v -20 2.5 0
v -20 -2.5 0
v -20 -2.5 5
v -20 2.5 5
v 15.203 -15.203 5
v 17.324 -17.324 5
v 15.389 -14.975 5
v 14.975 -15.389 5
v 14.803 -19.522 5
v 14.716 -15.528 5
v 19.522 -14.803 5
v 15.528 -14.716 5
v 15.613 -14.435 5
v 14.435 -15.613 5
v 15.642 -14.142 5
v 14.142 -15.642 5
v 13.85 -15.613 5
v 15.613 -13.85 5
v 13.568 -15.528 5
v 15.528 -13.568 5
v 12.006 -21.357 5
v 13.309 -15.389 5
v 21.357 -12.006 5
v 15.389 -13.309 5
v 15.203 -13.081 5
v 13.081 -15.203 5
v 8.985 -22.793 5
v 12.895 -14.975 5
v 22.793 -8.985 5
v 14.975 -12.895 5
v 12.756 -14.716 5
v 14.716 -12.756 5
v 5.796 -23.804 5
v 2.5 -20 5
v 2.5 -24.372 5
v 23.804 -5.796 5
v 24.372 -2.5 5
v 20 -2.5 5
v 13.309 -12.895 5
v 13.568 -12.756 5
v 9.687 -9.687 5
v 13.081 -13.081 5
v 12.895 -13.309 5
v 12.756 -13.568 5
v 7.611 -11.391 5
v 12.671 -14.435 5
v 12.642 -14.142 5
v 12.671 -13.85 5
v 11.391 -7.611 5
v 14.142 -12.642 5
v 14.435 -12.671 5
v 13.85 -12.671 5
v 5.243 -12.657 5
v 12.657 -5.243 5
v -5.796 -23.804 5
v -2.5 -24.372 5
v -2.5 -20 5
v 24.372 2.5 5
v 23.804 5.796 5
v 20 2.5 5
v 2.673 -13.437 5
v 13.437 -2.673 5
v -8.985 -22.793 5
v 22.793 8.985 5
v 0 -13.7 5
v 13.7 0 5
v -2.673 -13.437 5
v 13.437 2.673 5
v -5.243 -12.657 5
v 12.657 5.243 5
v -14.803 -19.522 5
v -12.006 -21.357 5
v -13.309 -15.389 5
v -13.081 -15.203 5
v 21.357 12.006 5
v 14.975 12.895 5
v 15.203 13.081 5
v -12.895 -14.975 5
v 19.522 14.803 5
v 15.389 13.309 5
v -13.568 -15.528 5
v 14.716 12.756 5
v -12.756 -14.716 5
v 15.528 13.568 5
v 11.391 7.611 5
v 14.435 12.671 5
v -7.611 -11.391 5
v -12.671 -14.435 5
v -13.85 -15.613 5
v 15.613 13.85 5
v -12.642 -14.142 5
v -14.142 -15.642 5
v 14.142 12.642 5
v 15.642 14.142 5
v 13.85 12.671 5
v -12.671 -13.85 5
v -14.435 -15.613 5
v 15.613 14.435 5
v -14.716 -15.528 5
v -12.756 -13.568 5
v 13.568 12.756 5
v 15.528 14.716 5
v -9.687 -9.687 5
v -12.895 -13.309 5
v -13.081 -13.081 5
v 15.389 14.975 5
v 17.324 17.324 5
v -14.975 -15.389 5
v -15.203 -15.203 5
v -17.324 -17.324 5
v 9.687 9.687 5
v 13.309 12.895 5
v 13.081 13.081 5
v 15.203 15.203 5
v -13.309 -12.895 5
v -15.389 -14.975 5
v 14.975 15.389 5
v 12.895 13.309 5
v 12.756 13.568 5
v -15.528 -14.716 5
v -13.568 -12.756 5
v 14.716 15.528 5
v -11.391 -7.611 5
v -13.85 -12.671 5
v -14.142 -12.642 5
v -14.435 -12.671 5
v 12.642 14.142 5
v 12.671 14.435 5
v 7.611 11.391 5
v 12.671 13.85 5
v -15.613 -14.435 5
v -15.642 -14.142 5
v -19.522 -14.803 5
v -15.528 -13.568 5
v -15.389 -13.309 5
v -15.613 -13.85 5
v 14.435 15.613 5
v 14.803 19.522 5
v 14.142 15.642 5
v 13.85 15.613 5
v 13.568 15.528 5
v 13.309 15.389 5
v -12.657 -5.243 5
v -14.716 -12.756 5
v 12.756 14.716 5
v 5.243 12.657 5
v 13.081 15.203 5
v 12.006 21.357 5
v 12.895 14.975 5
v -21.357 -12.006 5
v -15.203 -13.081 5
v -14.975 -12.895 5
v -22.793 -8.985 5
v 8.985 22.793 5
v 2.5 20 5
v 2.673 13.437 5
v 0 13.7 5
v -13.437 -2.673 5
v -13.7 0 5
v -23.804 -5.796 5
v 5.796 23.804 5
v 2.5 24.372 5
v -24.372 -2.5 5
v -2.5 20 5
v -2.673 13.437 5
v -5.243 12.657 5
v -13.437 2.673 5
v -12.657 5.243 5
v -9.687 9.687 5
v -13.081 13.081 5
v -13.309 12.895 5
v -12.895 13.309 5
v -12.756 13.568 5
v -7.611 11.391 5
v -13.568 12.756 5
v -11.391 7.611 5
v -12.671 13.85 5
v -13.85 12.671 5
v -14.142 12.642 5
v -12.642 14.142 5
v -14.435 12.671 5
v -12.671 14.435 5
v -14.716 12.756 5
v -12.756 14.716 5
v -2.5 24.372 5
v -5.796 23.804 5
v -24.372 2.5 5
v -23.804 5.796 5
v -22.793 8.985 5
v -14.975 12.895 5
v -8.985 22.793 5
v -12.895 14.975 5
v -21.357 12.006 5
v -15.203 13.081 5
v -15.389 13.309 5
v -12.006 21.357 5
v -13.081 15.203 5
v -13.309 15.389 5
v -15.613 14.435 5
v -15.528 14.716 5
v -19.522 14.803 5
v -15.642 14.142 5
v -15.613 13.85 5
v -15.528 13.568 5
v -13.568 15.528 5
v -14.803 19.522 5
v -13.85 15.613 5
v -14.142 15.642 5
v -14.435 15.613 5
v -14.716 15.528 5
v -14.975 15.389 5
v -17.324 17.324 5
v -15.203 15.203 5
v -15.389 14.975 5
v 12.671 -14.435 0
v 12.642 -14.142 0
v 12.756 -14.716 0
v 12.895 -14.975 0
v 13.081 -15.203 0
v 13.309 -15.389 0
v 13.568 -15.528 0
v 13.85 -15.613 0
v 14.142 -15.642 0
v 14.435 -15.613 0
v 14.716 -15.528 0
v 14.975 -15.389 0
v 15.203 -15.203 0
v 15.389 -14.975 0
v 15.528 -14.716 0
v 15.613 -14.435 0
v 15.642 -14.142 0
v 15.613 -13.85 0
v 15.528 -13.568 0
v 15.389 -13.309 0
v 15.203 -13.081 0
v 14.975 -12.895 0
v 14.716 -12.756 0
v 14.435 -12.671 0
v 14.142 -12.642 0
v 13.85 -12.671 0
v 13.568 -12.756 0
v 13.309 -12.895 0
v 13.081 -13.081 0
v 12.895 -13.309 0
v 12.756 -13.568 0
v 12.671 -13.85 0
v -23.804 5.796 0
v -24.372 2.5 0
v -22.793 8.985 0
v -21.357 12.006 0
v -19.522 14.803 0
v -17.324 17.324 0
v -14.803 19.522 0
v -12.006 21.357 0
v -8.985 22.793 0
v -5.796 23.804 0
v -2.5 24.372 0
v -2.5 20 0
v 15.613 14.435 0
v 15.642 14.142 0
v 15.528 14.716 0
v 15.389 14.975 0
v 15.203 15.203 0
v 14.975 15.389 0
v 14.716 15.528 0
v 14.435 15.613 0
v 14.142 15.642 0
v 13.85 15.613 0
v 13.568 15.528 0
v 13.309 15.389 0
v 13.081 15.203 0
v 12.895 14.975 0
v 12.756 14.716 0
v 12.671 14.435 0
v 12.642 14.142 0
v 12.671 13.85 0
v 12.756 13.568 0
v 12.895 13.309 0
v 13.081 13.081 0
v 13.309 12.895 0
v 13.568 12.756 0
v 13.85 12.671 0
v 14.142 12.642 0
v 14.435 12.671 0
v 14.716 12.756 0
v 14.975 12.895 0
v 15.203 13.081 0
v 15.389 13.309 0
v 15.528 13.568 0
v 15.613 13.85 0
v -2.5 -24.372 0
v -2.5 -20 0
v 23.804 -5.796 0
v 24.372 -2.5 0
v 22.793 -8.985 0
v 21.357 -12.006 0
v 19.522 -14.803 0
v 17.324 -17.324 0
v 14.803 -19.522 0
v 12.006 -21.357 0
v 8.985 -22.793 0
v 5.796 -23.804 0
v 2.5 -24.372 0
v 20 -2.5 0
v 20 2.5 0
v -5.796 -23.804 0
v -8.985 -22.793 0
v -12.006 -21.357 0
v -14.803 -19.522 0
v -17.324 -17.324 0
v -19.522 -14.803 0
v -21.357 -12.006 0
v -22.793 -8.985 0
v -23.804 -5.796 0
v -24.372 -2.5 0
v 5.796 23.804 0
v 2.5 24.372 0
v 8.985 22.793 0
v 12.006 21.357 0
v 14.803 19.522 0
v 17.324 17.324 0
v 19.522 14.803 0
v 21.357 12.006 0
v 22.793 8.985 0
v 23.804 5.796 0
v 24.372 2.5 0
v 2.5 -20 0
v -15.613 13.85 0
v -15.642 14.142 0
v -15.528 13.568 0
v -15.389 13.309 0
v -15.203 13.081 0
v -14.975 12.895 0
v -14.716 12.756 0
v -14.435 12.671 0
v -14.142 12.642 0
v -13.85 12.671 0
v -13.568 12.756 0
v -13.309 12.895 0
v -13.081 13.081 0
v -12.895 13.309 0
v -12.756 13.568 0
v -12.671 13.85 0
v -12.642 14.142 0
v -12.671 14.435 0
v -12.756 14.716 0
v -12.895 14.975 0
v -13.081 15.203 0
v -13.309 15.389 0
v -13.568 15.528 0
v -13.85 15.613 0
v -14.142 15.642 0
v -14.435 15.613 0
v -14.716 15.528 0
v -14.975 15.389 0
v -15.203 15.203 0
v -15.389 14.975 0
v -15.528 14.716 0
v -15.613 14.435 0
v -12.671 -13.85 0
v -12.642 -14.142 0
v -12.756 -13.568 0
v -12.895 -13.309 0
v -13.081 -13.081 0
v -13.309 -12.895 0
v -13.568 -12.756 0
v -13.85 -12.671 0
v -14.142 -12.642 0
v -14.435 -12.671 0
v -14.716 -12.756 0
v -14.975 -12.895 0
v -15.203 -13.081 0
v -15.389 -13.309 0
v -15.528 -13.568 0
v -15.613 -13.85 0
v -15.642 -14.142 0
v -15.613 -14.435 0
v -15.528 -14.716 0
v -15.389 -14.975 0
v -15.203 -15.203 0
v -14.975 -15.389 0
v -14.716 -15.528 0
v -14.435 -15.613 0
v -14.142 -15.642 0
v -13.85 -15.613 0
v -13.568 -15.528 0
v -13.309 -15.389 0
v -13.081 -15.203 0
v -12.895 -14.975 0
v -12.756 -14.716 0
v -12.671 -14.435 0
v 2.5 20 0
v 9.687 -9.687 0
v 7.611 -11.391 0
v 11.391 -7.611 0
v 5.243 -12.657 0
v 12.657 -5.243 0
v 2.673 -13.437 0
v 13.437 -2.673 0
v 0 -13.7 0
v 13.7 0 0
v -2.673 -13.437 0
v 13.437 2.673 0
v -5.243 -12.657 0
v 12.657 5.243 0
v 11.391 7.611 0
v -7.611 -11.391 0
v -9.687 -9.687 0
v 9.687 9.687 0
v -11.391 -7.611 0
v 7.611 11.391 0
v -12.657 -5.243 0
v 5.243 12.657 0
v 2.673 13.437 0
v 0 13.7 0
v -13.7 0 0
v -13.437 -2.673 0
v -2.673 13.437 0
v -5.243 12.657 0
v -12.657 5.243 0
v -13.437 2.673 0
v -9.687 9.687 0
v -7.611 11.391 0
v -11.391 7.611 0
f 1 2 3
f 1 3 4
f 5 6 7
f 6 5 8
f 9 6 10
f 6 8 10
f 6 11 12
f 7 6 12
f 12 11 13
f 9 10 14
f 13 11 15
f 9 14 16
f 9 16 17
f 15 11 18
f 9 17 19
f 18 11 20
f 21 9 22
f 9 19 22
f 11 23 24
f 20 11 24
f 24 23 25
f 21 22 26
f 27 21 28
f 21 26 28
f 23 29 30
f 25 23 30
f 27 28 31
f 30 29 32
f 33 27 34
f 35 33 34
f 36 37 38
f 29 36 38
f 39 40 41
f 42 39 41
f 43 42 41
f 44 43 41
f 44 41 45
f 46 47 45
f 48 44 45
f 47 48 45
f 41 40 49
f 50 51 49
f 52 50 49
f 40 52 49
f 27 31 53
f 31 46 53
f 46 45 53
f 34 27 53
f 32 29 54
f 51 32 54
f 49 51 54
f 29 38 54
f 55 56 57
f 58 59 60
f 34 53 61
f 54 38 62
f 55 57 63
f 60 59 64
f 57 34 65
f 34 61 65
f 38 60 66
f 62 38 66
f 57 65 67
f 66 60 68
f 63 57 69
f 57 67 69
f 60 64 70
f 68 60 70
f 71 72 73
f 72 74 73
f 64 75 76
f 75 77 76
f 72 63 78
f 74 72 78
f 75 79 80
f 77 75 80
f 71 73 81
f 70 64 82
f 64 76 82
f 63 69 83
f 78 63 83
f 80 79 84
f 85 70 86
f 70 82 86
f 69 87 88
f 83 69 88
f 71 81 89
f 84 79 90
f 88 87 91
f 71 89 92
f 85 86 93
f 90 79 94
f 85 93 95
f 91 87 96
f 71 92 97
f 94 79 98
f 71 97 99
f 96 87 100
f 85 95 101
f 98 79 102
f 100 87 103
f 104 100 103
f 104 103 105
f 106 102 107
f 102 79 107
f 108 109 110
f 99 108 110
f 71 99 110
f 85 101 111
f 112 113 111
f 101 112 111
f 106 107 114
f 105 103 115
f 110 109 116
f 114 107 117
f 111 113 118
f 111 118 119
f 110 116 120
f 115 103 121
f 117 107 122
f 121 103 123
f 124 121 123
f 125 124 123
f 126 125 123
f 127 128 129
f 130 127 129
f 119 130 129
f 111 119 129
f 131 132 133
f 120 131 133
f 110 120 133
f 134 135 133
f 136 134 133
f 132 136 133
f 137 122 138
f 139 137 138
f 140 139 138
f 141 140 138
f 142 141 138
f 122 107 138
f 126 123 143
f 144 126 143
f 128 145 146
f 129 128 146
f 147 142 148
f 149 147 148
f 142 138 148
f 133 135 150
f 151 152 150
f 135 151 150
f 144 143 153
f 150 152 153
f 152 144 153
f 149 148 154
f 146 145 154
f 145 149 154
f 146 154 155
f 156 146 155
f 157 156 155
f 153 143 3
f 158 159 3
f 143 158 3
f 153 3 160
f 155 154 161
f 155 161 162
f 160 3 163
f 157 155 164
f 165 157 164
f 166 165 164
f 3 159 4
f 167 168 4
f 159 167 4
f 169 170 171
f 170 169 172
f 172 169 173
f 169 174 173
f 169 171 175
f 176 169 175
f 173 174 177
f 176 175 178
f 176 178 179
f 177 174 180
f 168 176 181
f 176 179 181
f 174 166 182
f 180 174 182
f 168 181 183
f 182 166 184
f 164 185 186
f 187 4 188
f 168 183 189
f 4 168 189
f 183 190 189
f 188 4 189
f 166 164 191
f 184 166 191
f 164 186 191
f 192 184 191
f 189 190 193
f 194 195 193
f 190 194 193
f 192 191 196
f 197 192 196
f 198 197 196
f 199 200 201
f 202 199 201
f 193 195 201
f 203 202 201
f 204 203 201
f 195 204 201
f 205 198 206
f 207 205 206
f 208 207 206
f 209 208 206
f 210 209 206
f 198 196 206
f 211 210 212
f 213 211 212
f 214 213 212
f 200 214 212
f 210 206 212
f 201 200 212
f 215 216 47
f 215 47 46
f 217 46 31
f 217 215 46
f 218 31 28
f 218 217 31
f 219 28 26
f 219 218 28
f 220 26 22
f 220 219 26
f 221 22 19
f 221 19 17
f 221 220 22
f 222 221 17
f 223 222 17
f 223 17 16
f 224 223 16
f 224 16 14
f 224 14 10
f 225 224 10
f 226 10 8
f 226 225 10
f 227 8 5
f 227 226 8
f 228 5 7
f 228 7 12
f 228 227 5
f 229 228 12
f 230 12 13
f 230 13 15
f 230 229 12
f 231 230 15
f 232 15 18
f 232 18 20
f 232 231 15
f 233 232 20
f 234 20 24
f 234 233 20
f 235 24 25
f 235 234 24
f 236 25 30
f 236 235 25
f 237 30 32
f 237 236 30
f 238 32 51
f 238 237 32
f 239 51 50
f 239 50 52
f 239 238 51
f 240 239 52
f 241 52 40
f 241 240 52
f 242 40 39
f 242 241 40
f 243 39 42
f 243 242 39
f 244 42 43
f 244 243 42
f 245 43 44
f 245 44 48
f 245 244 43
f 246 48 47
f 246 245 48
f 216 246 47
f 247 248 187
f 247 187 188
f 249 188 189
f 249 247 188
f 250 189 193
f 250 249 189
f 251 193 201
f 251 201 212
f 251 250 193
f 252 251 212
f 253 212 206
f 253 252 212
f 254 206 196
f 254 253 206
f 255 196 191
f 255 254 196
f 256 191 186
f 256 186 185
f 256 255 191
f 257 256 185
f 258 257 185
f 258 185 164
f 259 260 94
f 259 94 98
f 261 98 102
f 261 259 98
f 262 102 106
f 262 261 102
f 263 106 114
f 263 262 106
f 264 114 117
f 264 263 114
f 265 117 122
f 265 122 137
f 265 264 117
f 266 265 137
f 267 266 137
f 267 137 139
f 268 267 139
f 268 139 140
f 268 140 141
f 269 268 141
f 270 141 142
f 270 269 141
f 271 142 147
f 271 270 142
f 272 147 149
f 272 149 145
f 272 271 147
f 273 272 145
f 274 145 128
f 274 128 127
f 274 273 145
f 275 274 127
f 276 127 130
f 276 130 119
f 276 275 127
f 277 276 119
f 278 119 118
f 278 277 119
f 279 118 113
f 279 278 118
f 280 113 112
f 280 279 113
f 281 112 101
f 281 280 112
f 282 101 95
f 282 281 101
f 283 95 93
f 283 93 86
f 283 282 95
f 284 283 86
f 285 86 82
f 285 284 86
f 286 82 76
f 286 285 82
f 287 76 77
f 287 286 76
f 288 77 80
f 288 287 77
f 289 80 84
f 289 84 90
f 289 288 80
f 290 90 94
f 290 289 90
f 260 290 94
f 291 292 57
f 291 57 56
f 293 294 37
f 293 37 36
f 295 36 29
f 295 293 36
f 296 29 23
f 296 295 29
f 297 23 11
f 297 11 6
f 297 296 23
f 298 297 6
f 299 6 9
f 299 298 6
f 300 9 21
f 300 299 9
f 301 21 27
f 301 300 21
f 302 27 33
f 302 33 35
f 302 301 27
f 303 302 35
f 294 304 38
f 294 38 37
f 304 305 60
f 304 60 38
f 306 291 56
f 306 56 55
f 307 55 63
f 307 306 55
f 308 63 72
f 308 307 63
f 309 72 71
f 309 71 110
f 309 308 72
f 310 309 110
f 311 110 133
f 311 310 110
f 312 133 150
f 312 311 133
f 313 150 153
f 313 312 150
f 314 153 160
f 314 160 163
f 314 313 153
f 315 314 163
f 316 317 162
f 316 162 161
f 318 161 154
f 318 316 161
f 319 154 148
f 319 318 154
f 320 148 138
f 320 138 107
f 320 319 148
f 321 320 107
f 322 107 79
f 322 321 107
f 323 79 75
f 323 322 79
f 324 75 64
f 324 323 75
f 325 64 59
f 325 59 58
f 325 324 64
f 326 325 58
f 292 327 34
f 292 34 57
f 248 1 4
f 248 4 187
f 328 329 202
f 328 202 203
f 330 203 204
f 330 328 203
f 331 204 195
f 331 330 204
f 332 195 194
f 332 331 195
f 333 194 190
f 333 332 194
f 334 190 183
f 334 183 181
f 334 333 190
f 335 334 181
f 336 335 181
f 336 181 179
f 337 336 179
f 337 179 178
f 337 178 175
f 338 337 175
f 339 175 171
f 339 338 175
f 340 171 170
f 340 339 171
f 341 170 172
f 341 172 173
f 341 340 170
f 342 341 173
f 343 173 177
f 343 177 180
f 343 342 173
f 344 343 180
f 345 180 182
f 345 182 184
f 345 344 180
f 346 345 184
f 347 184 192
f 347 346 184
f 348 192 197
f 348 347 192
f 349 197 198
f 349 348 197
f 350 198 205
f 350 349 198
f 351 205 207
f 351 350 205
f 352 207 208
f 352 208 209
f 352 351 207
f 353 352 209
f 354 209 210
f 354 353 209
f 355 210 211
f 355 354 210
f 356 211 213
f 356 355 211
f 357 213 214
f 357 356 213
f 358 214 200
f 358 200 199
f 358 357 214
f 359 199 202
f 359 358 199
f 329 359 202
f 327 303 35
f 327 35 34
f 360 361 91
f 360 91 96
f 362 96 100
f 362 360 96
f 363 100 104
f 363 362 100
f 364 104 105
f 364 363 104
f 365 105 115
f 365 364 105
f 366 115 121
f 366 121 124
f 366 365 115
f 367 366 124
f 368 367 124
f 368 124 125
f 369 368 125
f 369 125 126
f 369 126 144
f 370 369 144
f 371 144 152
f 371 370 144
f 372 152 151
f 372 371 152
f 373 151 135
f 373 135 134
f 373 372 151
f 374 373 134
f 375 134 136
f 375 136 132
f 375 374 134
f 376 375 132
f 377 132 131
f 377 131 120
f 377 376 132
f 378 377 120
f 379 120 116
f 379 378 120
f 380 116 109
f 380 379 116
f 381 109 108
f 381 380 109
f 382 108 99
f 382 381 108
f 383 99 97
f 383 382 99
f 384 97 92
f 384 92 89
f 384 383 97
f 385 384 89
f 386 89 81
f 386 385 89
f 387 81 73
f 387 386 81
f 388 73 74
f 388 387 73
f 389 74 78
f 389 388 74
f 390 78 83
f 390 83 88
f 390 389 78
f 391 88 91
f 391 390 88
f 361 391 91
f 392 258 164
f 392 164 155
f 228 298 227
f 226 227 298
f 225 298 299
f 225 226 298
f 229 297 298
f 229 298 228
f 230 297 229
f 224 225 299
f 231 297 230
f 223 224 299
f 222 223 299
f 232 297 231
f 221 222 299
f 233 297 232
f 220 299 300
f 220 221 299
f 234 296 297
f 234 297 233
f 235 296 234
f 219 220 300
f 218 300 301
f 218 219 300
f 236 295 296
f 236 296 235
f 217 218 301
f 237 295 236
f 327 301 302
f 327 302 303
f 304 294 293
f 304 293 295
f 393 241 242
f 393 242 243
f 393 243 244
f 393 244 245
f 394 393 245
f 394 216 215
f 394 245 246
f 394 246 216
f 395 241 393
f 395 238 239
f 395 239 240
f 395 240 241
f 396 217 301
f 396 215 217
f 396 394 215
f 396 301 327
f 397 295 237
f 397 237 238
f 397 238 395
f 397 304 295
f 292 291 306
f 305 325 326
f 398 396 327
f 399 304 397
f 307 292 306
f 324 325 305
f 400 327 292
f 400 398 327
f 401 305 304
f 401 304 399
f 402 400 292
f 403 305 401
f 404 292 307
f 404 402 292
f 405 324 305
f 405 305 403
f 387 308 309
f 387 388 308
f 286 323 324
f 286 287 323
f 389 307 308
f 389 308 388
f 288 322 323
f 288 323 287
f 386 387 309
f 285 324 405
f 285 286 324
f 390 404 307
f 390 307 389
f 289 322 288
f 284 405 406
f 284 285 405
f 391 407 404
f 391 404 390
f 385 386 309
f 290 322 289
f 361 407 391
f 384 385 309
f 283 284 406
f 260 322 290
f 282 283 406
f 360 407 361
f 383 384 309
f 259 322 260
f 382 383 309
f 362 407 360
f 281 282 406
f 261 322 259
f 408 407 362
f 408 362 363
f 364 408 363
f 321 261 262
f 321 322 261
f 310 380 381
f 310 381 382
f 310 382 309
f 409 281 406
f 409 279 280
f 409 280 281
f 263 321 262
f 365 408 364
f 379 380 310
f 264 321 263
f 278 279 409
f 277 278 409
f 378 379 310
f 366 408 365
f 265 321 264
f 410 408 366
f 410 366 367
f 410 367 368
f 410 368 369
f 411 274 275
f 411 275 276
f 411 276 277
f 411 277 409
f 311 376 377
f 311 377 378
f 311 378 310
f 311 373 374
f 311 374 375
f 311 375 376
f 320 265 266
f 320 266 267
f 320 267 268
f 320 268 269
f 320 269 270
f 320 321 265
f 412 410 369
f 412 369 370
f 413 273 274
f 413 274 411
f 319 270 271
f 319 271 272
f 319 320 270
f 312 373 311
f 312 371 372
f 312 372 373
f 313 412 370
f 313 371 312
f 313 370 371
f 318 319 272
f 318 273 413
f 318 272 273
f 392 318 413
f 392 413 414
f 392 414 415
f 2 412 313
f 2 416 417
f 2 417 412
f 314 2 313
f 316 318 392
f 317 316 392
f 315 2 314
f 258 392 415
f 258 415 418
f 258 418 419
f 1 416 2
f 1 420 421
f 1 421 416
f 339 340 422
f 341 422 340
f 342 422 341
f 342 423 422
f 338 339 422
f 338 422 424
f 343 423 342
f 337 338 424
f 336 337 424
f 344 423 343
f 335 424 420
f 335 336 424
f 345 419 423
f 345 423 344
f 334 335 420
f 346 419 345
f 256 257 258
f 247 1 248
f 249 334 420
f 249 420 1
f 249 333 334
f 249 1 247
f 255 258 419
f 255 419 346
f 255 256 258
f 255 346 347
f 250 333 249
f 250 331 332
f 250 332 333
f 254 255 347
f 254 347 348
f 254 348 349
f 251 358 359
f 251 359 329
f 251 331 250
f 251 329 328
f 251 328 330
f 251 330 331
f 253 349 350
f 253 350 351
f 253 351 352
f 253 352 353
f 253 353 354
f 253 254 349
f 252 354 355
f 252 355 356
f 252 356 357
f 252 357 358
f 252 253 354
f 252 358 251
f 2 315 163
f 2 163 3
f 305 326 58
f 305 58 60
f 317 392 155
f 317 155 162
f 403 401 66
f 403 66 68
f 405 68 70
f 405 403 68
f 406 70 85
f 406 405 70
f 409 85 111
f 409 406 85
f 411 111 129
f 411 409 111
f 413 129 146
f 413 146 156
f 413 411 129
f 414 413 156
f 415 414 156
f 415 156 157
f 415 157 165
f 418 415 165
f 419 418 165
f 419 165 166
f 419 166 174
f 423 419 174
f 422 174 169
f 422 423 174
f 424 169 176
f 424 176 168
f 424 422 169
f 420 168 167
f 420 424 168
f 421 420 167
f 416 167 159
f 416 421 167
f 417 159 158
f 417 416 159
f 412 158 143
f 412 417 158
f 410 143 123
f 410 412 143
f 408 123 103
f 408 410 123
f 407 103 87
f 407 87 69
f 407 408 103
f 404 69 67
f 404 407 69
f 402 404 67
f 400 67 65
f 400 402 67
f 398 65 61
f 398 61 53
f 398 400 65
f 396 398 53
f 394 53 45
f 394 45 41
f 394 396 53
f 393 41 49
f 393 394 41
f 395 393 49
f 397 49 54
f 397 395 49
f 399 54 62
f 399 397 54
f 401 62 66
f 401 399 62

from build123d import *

# Parameters (mm, degrees)
ESQUISSE1_R        = 13.7
ESQUISSE1_R_2      = 1.5
BOSS_EXTRU_1_DEPTH = 5


with BuildPart() as part:
    # Esquisse1 → Boss.-Extru.1 (new body)
    with BuildSketch(Plane.XY):
        with BuildLine():
            Line((24.372115214, 2.5), (20, 2.5))
            Line((20, 2.5), (20, -2.5))
            Line((20, -2.5), (24.372115214, -2.5))
            ThreePointArc((24.372115214, -2.5), (17.324116139, -17.324116139), (2.5, -24.372115214))
            Line((2.5, -24.372115214), (2.5, -20))
            Line((2.5, -20), (-2.5, -20))
            Line((-2.5, -20), (-2.5, -24.372115214))
            ThreePointArc((-2.5, -24.372115214), (-17.324116139, -17.324116139), (-24.372115214, -2.5))
            Line((-24.372115214, -2.5), (-20, -2.5))
            Line((-20, -2.5), (-20, 2.5))
            Line((-20, 2.5), (-24.372115214, 2.5))
            ThreePointArc((-24.372115214, 2.5), (-17.324116139, 17.324116139), (-2.5, 24.372115214))
            Line((-2.5, 24.372115214), (-2.5, 20))
            Line((-2.5, 20), (2.5, 20))
            Line((2.5, 20), (2.5, 24.372115214))
            ThreePointArc((2.5, 24.372115214), (17.324116139, 17.324116139), (24.372115214, 2.5))
        make_face()
        Circle(ESQUISSE1_R, mode=Mode.SUBTRACT)
        with Locations((14.142135624, 14.142135624)):
            Circle(ESQUISSE1_R_2, mode=Mode.SUBTRACT)
        with Locations(Location((14.142135624, -14.142135624, 0), (0, 0, 180))):
            Circle(ESQUISSE1_R_2, mode=Mode.SUBTRACT)
        with Locations(Location((-14.142135624, 14.142135624, 0), (0, 0, 180))):
            Circle(ESQUISSE1_R_2, mode=Mode.SUBTRACT)
        with Locations((-14.142135624, -14.142135624)):
            Circle(ESQUISSE1_R_2, mode=Mode.SUBTRACT)
    extrude(amount=BOSS_EXTRU_1_DEPTH)


solid = part.part
